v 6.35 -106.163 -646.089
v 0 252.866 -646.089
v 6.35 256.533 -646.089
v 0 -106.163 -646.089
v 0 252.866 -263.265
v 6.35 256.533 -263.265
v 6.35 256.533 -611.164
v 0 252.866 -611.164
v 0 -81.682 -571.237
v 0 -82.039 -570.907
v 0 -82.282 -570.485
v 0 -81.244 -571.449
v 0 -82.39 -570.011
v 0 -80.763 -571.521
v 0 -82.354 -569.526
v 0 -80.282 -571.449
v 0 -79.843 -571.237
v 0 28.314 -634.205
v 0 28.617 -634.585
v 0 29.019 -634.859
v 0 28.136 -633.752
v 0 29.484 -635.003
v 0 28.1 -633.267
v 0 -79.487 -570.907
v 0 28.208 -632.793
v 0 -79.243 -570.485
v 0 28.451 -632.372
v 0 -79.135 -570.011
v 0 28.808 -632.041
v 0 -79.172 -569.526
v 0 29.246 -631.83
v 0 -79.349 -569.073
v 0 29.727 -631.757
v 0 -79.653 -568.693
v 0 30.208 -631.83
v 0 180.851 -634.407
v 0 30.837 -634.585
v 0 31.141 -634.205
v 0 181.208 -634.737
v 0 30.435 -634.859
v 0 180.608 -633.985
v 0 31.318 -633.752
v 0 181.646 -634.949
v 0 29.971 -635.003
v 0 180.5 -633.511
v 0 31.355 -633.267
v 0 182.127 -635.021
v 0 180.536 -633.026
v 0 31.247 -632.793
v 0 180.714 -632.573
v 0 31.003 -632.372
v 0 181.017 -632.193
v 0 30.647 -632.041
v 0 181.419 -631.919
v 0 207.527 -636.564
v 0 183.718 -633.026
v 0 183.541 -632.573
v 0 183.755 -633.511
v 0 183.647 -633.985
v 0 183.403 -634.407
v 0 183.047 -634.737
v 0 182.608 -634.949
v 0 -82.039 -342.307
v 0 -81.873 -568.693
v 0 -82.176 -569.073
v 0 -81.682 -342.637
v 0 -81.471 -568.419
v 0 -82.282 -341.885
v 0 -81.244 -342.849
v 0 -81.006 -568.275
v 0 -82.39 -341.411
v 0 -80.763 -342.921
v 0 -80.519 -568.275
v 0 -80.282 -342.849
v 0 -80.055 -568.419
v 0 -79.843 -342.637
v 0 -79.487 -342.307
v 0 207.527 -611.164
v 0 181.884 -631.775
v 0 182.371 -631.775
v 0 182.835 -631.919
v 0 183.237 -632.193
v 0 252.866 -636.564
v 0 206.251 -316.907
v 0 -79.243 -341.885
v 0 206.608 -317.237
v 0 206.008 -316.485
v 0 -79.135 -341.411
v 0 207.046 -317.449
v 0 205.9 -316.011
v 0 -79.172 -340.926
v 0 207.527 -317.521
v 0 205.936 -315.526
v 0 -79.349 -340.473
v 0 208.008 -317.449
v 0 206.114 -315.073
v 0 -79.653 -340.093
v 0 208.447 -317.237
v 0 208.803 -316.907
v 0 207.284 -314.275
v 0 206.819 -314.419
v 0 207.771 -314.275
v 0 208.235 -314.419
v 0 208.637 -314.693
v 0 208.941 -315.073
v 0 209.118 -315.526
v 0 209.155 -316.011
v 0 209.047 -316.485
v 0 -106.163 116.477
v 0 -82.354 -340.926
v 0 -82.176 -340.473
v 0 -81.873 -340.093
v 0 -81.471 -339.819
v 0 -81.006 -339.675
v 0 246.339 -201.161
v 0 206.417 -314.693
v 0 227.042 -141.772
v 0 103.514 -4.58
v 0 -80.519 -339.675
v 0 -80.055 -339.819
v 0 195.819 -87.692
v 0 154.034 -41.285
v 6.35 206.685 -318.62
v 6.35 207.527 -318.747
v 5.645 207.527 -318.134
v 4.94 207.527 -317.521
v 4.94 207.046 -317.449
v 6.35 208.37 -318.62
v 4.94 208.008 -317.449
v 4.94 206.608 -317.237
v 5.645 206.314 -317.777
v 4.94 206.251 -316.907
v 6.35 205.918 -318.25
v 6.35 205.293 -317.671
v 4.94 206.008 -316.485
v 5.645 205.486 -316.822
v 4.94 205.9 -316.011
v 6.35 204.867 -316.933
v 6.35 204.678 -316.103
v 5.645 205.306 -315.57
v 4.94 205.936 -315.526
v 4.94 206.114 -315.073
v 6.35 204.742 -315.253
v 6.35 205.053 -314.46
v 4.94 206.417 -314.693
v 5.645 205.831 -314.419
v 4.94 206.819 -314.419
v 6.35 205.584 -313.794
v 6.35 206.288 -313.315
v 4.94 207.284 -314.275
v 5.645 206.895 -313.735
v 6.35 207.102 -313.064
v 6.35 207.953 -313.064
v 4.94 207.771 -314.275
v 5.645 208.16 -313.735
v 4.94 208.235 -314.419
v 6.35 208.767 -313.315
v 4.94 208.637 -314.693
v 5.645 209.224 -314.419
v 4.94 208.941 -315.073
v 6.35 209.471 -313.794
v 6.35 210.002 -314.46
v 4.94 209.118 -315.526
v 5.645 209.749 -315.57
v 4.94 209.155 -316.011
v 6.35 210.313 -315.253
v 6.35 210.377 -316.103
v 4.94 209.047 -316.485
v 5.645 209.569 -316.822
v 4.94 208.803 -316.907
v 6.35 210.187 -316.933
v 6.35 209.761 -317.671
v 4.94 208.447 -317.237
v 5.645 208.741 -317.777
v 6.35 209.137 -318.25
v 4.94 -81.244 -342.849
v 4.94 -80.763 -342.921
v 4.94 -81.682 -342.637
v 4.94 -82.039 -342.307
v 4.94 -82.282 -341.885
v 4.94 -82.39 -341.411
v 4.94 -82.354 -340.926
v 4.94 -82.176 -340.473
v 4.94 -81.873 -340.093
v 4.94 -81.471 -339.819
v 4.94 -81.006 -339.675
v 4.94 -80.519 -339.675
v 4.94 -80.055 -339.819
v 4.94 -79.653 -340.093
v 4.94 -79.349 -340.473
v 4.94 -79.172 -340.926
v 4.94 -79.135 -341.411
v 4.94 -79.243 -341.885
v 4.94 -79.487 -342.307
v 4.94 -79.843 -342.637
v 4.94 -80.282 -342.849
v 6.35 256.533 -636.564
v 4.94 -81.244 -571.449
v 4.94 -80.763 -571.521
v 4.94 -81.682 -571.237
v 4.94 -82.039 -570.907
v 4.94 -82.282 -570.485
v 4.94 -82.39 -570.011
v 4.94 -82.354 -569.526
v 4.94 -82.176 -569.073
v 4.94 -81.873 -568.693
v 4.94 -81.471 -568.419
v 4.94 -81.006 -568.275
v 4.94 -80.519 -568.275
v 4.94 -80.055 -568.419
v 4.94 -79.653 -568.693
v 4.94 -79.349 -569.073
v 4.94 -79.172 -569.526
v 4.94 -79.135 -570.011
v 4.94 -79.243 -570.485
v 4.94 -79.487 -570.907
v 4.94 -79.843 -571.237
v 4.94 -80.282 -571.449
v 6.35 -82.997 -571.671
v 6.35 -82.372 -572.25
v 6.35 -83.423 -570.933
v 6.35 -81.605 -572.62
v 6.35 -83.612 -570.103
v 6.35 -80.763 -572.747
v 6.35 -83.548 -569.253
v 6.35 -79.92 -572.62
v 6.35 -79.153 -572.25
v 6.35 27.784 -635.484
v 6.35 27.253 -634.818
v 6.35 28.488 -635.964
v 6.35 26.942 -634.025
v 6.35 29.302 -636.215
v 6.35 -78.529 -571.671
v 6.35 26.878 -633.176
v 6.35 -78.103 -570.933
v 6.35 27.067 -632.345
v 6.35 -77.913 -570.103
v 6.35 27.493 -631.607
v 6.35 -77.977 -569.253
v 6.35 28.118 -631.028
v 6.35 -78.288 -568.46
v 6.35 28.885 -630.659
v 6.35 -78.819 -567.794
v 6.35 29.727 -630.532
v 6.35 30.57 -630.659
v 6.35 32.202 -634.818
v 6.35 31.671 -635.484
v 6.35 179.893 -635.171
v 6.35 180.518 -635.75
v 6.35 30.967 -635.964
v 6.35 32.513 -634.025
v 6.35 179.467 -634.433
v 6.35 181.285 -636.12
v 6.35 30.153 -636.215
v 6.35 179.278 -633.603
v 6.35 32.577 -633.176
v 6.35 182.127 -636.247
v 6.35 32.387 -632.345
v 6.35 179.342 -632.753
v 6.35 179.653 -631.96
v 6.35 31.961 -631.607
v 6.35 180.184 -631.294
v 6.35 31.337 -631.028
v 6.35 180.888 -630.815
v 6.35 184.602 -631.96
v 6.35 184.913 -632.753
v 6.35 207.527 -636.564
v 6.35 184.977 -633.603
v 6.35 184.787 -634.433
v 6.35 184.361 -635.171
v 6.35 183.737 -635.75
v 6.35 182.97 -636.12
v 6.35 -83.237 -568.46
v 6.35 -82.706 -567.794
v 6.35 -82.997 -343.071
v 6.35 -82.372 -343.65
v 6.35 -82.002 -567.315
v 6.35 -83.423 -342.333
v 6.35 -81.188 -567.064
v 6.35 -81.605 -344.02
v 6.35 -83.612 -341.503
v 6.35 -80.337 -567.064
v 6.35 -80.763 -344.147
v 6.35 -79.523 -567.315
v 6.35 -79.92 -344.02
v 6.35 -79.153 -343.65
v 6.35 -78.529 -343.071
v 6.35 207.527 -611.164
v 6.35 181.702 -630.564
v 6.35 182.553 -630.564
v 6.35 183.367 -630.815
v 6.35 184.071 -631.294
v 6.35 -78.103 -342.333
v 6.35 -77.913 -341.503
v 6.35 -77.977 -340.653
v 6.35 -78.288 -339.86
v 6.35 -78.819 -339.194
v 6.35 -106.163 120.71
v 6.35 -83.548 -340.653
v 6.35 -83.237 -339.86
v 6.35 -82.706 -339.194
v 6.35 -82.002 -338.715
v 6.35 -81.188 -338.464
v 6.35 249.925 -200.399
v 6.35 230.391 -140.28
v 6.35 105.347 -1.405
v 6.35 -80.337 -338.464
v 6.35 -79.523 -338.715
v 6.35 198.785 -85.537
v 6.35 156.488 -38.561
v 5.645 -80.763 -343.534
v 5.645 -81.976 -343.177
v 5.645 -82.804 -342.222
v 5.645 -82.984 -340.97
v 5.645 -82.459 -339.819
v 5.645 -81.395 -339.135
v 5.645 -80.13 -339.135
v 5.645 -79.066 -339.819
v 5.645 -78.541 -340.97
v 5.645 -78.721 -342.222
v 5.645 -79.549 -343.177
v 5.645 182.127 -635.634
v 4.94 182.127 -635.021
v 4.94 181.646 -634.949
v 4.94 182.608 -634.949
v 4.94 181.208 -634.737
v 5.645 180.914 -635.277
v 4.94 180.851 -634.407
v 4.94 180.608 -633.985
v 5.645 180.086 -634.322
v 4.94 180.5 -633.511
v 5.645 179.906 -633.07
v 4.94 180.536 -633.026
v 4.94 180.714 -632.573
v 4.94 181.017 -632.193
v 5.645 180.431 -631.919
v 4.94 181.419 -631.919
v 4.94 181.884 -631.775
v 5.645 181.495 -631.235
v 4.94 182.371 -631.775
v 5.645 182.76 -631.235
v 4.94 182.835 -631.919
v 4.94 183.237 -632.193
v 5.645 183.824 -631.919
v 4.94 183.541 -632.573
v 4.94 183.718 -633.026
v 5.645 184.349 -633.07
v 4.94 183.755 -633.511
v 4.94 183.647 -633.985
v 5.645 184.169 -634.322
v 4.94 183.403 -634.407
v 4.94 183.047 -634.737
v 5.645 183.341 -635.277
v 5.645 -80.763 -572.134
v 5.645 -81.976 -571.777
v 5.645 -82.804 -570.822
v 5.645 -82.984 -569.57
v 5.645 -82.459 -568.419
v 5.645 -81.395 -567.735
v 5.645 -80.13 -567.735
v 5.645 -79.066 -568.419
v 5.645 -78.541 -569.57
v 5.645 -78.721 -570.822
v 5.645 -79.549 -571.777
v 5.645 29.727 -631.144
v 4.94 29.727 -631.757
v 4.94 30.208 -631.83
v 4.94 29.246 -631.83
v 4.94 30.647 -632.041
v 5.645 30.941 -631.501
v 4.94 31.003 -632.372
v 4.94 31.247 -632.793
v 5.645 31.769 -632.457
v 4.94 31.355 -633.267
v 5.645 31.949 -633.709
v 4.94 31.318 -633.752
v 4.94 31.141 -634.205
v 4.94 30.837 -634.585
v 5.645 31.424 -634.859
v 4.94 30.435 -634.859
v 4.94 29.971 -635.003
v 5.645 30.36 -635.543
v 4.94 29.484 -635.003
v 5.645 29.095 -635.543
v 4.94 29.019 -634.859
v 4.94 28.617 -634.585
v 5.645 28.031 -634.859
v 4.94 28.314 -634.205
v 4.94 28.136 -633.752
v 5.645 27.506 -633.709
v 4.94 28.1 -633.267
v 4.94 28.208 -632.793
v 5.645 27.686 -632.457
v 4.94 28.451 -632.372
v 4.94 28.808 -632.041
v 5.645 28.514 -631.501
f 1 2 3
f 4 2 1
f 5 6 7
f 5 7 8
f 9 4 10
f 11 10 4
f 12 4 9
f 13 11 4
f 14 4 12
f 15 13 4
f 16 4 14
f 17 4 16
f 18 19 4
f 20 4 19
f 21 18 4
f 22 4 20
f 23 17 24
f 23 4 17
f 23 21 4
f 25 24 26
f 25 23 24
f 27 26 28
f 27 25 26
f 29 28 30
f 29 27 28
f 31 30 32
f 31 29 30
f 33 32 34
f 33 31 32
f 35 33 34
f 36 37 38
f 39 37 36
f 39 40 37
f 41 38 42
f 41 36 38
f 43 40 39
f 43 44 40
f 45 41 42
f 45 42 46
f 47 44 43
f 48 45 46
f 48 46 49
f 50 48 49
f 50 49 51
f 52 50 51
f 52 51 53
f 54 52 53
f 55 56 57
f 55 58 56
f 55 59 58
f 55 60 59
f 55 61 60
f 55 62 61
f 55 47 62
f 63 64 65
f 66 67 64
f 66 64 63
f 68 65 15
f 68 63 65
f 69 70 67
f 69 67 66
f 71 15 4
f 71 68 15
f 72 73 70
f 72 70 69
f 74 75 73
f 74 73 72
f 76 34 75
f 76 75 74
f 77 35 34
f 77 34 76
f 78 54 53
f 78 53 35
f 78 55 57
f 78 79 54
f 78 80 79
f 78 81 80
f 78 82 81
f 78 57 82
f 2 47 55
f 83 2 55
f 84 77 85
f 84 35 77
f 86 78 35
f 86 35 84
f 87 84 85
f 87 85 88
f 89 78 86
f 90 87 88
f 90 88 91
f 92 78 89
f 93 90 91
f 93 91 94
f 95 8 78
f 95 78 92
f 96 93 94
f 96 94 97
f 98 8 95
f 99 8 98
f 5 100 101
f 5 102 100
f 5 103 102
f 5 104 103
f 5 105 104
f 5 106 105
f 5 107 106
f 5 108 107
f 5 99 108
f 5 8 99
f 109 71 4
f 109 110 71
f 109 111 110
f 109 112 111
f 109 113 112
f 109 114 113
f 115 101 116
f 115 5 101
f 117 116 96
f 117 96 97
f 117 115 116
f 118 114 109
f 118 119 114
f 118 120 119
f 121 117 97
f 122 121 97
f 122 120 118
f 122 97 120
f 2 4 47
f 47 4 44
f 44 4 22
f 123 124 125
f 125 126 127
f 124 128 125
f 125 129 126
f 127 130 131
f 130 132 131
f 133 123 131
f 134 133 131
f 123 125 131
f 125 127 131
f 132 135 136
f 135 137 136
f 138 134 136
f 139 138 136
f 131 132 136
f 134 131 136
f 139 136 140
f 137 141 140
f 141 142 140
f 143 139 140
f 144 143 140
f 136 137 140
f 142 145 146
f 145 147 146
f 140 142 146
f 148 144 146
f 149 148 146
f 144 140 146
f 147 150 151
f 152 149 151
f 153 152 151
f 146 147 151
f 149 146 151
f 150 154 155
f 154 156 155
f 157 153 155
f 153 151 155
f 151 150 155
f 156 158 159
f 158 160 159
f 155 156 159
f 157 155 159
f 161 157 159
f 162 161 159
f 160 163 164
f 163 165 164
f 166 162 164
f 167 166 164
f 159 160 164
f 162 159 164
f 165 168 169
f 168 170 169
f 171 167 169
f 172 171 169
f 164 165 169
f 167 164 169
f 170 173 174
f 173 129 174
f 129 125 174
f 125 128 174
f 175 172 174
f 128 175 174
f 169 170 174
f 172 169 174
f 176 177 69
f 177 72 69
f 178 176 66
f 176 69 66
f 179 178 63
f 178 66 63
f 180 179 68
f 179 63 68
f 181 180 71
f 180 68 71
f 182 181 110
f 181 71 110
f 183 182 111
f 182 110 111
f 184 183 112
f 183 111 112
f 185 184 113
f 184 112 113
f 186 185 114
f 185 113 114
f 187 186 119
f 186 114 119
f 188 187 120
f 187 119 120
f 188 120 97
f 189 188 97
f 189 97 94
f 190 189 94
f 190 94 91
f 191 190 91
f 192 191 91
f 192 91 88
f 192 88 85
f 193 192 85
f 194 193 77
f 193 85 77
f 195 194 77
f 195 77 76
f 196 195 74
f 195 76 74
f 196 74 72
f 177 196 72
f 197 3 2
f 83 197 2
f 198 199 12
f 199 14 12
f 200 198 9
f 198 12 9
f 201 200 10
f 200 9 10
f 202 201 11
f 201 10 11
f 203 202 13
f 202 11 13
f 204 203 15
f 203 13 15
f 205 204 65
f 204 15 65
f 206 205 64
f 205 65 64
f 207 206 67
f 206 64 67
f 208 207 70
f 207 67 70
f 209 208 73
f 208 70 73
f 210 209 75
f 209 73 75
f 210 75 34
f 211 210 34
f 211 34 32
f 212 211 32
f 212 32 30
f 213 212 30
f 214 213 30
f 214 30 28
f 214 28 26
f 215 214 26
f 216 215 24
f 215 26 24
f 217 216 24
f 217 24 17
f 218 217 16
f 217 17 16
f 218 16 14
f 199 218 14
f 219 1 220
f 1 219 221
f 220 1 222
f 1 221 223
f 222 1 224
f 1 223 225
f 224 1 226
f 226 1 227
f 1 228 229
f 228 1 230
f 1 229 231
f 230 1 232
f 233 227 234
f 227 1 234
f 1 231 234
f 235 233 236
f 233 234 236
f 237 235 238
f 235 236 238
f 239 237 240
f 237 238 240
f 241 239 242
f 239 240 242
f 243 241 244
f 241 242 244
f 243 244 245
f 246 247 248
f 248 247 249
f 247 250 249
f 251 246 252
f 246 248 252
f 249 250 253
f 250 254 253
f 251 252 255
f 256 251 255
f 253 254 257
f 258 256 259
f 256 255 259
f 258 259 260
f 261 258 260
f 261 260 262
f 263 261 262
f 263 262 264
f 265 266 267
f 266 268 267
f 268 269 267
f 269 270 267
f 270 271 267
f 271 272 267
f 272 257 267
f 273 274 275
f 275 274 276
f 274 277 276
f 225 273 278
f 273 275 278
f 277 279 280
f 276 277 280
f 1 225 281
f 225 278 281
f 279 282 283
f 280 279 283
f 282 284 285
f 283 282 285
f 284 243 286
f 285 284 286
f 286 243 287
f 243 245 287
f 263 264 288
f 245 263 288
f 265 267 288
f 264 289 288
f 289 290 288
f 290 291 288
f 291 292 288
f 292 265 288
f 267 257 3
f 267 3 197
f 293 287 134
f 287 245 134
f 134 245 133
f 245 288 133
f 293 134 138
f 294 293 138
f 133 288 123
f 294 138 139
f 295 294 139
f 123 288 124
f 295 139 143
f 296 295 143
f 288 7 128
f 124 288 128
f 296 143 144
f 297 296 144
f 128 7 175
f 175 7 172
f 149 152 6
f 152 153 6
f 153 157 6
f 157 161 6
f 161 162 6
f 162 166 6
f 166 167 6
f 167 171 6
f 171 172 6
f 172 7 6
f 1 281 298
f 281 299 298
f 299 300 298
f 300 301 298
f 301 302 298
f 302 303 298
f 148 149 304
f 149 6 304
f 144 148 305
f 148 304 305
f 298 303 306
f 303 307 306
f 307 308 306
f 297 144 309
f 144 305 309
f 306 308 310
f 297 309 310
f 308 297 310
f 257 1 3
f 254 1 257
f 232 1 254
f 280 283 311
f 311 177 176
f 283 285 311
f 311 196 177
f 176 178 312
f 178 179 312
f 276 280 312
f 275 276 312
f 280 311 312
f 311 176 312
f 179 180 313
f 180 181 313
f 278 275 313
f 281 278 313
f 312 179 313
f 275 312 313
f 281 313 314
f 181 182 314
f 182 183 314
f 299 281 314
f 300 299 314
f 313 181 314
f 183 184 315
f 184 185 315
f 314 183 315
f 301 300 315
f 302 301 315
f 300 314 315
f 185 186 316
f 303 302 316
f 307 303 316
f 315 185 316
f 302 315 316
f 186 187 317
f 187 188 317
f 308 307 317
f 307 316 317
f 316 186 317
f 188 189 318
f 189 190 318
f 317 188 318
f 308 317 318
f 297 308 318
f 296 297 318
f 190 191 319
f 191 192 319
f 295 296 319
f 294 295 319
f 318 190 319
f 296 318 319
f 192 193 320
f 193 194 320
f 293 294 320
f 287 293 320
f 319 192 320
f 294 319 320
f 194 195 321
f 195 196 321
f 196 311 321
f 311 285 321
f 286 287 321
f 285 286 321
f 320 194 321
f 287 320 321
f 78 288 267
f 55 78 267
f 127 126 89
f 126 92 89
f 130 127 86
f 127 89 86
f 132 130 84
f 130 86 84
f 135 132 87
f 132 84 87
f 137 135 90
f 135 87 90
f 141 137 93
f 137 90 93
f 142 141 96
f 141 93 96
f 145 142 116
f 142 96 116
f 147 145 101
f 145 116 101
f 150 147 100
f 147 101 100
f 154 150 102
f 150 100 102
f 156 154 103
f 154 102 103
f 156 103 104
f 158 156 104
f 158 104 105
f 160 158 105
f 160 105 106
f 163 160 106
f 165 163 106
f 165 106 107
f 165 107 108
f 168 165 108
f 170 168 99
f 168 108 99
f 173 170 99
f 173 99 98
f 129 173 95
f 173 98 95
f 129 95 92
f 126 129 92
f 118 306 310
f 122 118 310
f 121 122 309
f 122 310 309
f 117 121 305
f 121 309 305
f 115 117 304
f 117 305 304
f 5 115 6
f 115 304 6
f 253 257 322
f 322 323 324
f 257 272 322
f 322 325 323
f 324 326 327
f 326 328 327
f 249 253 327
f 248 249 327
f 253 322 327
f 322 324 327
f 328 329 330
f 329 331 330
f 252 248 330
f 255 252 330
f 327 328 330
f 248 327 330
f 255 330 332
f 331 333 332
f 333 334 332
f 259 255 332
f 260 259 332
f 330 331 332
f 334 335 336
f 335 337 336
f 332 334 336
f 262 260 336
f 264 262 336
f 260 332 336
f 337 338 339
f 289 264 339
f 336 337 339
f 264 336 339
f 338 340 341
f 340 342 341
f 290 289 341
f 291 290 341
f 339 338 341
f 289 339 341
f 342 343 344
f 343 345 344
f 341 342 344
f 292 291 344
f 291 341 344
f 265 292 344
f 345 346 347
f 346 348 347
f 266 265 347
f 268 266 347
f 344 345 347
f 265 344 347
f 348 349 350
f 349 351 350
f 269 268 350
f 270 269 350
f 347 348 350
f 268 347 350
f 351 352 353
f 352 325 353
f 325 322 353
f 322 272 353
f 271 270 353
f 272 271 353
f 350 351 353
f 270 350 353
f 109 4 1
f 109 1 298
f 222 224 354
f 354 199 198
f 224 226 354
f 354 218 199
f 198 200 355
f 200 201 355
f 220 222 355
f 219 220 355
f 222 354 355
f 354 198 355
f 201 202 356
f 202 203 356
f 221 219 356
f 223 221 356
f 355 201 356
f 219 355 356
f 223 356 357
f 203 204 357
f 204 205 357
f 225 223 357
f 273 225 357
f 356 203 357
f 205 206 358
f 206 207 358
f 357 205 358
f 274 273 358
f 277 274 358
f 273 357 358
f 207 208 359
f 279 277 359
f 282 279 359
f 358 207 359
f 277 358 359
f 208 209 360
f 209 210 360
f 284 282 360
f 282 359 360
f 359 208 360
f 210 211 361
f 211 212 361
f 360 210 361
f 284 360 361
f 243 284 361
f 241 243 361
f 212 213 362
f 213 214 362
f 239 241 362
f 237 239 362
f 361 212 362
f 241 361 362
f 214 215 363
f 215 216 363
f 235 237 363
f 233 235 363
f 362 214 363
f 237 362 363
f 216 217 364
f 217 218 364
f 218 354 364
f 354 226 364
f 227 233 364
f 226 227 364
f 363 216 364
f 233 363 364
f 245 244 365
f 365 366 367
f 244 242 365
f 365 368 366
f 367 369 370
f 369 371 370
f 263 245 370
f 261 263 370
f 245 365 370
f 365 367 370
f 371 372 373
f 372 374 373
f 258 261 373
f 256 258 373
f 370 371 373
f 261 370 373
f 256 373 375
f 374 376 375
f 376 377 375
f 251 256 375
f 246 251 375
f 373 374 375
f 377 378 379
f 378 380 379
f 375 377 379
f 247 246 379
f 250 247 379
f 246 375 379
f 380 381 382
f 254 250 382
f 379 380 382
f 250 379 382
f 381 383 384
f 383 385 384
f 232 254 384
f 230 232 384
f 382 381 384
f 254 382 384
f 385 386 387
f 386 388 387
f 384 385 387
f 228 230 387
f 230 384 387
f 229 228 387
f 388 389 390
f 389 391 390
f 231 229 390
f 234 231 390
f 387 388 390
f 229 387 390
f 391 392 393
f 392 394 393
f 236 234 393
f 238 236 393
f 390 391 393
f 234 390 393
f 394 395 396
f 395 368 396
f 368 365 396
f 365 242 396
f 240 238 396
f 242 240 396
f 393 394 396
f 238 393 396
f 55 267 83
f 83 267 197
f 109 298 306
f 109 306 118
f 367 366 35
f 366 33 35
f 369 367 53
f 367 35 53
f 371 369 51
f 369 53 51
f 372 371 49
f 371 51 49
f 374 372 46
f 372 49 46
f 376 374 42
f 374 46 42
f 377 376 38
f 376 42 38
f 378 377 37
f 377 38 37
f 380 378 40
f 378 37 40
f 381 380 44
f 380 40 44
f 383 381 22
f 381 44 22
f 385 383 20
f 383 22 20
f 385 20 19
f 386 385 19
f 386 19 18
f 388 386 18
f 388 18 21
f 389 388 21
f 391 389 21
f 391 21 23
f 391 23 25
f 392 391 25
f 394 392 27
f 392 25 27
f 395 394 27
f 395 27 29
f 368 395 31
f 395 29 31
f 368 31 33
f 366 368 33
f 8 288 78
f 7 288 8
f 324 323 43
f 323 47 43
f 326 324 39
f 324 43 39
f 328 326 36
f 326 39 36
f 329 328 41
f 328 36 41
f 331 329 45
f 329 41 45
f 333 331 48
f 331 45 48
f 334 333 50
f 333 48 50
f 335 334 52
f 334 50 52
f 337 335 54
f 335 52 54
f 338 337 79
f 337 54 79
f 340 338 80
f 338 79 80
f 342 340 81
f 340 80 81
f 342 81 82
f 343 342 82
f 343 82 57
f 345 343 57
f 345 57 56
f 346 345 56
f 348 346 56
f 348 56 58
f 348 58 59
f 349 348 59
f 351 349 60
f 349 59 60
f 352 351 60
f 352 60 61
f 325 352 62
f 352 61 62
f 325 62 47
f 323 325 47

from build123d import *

# Parameters (mm, degrees)
BOSS_EXTRUDE1_DEPTH                            = 6.35
CSK_FOR_4_FLAT_HEAD_MACHINE_SCREW1_D           = 3.2639
CSK_FOR_4_FLAT_HEAD_MACHINE_SCREW1_CSINK_D     = 5.715
CSK_FOR_4_FLAT_HEAD_MACHINE_SCREW1_CSINK_ANGLE = 82
CSK_FOR_4_FLAT_HEAD_MACHINE_SCREW2_D           = 3.2639
CSK_FOR_4_FLAT_HEAD_MACHINE_SCREW2_CSINK_D     = 5.715
CSK_FOR_4_FLAT_HEAD_MACHINE_SCREW2_CSINK_ANGLE = 82
CHAMFER1_SIZE                                  = 10.558581723
CHAMFER1_SIZE_2                                = 6.096
CUT_EXTRUDE1_REACH                             = 697.184
SKETCH8_W                                      = 25.4
SKETCH8_H                                      = 49.00517421
CSK_FOR_4_FLAT_HEAD_MACHINE_SCREW3_D           = 3.2639
CSK_FOR_4_FLAT_HEAD_MACHINE_SCREW3_CSINK_D     = 5.715
CSK_FOR_4_FLAT_HEAD_MACHINE_SCREW3_CSINK_ANGLE = 82


with BuildPart() as part:
    # Sketch1 → Boss-Extrude1 (new body)
    with BuildSketch(Plane(origin=(0, 0, 0), x_dir=(0, 0, -1), z_dir=(1, 0, 0))):
        with BuildLine():
            Line((-123.515928009, -106.162611625), (-0.699091996, 106.562388375))
            ThreePointArc((-0.699091996, 106.562388375), (110.865451078, 218.126931449), (263.265451078, 258.962388375))
            Line((263.265451078, 258.962388375), (646.089089029, 258.962388375))
            Line((646.089089029, 258.962388375), (646.089089029, -106.162611625))
            Line((646.089089029, -106.162611625), (-123.515928009, -106.162611625))
        make_face()
    extrude(amount=BOSS_EXTRUDE1_DEPTH)

    # CSK for #4 Flat Head Machine Screw1 (through all)
    with Locations(Plane(origin=(6.35, 0, 0), x_dir=(0, 0, -1), z_dir=(1, 0, 0))):
        with Locations((633.389089029, 29.727388375)):
            CounterSinkHole(CSK_FOR_4_FLAT_HEAD_MACHINE_SCREW1_D / 2, CSK_FOR_4_FLAT_HEAD_MACHINE_SCREW1_CSINK_D / 2, counter_sink_angle=CSK_FOR_4_FLAT_HEAD_MACHINE_SCREW1_CSINK_ANGLE)

    # CSK for #4 Flat Head Machine Screw2 (through all)
    with Locations(Plane(origin=(6.35, 207.527388375, -315.889089029), x_dir=(0, 0, 1), z_dir=(1, 0, 0))):
        with Locations((0, 0), (-317.5, 25.4)):
            CounterSinkHole(CSK_FOR_4_FLAT_HEAD_MACHINE_SCREW2_D / 2, CSK_FOR_4_FLAT_HEAD_MACHINE_SCREW2_CSINK_D / 2, counter_sink_angle=CSK_FOR_4_FLAT_HEAD_MACHINE_SCREW2_CSINK_ANGLE)

    # Chamfer1
    # the kernel refuses this chamfer: 10.558581723, 6.096 mm, written as the material it takes off along each edge
    with BuildSketch(Plane(origin=(0, -129.818923765, 137.173906191), x_dir=(0.9998132206222078, 0.009663382806350982, 0.016737469993587533), z_dir=(0, 0.8660254037844402, -0.49999999999999756))) as chamfer1_piece_1:
        Polygon((CHAMFER1_SIZE * 0.999813220617, CHAMFER1_SIZE * 0.0193267656126), (-CHAMFER1_SIZE_2 * 0.0193267656127, CHAMFER1_SIZE_2 * 0.999813220622), (0, 0), align=None)
    extrude(amount=272.949628391, mode=Mode.SUBTRACT)
    with BuildSketch(Plane(origin=(0, -45.837611625, -263.265451078), x_dir=(0, 0.5000000000000027, 0.8660254037844372), z_dir=(0, -0.8660254037844372, 0.5000000000000027))) as chamfer1_piece_2:
        Polygon((304.8 - CHAMFER1_SIZE_2, 0), (304.8, -CHAMFER1_SIZE), (304.8, 0), align=None)
    revolve(axis=Axis((0, -45.837611625, -263.265451078), (-1, 0, 0)), revolution_arc=60, mode=Mode.SUBTRACT)
    with BuildSketch(Plane(origin=(0, 258.962388375, -263.265451078), x_dir=(0.9998132206222078, 0.01932676561270281, 0), z_dir=(0, 0, -1))) as chamfer1_piece_3:
        Polygon((CHAMFER1_SIZE * 0.999813220617, CHAMFER1_SIZE * 0.0193267656126), (-CHAMFER1_SIZE_2 * 0.0193267656127, CHAMFER1_SIZE_2 * 0.999813220622), (0, 0), align=None)
    extrude(amount=410.139594316, mode=Mode.SUBTRACT)

    # Sketch8 → Cut-Extrude1 (cut, up to next)
    with BuildSketch(Plane(origin=(6.35, 0, 0), x_dir=(0, 0, -1), z_dir=(1, 0, 0)), mode=Mode.PRIVATE) as cut_extrude1_sk1:
        with Locations((623.864089029, 232.02997548)):
            Rectangle(SKETCH8_W, SKETCH8_H)
    cut_extrude1_tool1 = extrude(cut_extrude1_sk1.sketch, amount=-CUT_EXTRUDE1_REACH, mode=Mode.PRIVATE) & part.part
    add(cut_extrude1_tool1.solids().sort_by_distance((6.35, 232.029975, -623.864089))[0], mode=Mode.SUBTRACT)

    # CSK for #4 Flat Head Machine Screw3 (through all)
    with Locations(Plane(origin=(6.35, -80.762611625, -569.889089029), x_dir=(0, 0, 1), z_dir=(1, 0, 0))):
        with Locations((0, 0), (228.6, 0)):
            CounterSinkHole(CSK_FOR_4_FLAT_HEAD_MACHINE_SCREW3_D / 2, CSK_FOR_4_FLAT_HEAD_MACHINE_SCREW3_CSINK_D / 2, counter_sink_angle=CSK_FOR_4_FLAT_HEAD_MACHINE_SCREW3_CSINK_ANGLE)


solid = part.part
